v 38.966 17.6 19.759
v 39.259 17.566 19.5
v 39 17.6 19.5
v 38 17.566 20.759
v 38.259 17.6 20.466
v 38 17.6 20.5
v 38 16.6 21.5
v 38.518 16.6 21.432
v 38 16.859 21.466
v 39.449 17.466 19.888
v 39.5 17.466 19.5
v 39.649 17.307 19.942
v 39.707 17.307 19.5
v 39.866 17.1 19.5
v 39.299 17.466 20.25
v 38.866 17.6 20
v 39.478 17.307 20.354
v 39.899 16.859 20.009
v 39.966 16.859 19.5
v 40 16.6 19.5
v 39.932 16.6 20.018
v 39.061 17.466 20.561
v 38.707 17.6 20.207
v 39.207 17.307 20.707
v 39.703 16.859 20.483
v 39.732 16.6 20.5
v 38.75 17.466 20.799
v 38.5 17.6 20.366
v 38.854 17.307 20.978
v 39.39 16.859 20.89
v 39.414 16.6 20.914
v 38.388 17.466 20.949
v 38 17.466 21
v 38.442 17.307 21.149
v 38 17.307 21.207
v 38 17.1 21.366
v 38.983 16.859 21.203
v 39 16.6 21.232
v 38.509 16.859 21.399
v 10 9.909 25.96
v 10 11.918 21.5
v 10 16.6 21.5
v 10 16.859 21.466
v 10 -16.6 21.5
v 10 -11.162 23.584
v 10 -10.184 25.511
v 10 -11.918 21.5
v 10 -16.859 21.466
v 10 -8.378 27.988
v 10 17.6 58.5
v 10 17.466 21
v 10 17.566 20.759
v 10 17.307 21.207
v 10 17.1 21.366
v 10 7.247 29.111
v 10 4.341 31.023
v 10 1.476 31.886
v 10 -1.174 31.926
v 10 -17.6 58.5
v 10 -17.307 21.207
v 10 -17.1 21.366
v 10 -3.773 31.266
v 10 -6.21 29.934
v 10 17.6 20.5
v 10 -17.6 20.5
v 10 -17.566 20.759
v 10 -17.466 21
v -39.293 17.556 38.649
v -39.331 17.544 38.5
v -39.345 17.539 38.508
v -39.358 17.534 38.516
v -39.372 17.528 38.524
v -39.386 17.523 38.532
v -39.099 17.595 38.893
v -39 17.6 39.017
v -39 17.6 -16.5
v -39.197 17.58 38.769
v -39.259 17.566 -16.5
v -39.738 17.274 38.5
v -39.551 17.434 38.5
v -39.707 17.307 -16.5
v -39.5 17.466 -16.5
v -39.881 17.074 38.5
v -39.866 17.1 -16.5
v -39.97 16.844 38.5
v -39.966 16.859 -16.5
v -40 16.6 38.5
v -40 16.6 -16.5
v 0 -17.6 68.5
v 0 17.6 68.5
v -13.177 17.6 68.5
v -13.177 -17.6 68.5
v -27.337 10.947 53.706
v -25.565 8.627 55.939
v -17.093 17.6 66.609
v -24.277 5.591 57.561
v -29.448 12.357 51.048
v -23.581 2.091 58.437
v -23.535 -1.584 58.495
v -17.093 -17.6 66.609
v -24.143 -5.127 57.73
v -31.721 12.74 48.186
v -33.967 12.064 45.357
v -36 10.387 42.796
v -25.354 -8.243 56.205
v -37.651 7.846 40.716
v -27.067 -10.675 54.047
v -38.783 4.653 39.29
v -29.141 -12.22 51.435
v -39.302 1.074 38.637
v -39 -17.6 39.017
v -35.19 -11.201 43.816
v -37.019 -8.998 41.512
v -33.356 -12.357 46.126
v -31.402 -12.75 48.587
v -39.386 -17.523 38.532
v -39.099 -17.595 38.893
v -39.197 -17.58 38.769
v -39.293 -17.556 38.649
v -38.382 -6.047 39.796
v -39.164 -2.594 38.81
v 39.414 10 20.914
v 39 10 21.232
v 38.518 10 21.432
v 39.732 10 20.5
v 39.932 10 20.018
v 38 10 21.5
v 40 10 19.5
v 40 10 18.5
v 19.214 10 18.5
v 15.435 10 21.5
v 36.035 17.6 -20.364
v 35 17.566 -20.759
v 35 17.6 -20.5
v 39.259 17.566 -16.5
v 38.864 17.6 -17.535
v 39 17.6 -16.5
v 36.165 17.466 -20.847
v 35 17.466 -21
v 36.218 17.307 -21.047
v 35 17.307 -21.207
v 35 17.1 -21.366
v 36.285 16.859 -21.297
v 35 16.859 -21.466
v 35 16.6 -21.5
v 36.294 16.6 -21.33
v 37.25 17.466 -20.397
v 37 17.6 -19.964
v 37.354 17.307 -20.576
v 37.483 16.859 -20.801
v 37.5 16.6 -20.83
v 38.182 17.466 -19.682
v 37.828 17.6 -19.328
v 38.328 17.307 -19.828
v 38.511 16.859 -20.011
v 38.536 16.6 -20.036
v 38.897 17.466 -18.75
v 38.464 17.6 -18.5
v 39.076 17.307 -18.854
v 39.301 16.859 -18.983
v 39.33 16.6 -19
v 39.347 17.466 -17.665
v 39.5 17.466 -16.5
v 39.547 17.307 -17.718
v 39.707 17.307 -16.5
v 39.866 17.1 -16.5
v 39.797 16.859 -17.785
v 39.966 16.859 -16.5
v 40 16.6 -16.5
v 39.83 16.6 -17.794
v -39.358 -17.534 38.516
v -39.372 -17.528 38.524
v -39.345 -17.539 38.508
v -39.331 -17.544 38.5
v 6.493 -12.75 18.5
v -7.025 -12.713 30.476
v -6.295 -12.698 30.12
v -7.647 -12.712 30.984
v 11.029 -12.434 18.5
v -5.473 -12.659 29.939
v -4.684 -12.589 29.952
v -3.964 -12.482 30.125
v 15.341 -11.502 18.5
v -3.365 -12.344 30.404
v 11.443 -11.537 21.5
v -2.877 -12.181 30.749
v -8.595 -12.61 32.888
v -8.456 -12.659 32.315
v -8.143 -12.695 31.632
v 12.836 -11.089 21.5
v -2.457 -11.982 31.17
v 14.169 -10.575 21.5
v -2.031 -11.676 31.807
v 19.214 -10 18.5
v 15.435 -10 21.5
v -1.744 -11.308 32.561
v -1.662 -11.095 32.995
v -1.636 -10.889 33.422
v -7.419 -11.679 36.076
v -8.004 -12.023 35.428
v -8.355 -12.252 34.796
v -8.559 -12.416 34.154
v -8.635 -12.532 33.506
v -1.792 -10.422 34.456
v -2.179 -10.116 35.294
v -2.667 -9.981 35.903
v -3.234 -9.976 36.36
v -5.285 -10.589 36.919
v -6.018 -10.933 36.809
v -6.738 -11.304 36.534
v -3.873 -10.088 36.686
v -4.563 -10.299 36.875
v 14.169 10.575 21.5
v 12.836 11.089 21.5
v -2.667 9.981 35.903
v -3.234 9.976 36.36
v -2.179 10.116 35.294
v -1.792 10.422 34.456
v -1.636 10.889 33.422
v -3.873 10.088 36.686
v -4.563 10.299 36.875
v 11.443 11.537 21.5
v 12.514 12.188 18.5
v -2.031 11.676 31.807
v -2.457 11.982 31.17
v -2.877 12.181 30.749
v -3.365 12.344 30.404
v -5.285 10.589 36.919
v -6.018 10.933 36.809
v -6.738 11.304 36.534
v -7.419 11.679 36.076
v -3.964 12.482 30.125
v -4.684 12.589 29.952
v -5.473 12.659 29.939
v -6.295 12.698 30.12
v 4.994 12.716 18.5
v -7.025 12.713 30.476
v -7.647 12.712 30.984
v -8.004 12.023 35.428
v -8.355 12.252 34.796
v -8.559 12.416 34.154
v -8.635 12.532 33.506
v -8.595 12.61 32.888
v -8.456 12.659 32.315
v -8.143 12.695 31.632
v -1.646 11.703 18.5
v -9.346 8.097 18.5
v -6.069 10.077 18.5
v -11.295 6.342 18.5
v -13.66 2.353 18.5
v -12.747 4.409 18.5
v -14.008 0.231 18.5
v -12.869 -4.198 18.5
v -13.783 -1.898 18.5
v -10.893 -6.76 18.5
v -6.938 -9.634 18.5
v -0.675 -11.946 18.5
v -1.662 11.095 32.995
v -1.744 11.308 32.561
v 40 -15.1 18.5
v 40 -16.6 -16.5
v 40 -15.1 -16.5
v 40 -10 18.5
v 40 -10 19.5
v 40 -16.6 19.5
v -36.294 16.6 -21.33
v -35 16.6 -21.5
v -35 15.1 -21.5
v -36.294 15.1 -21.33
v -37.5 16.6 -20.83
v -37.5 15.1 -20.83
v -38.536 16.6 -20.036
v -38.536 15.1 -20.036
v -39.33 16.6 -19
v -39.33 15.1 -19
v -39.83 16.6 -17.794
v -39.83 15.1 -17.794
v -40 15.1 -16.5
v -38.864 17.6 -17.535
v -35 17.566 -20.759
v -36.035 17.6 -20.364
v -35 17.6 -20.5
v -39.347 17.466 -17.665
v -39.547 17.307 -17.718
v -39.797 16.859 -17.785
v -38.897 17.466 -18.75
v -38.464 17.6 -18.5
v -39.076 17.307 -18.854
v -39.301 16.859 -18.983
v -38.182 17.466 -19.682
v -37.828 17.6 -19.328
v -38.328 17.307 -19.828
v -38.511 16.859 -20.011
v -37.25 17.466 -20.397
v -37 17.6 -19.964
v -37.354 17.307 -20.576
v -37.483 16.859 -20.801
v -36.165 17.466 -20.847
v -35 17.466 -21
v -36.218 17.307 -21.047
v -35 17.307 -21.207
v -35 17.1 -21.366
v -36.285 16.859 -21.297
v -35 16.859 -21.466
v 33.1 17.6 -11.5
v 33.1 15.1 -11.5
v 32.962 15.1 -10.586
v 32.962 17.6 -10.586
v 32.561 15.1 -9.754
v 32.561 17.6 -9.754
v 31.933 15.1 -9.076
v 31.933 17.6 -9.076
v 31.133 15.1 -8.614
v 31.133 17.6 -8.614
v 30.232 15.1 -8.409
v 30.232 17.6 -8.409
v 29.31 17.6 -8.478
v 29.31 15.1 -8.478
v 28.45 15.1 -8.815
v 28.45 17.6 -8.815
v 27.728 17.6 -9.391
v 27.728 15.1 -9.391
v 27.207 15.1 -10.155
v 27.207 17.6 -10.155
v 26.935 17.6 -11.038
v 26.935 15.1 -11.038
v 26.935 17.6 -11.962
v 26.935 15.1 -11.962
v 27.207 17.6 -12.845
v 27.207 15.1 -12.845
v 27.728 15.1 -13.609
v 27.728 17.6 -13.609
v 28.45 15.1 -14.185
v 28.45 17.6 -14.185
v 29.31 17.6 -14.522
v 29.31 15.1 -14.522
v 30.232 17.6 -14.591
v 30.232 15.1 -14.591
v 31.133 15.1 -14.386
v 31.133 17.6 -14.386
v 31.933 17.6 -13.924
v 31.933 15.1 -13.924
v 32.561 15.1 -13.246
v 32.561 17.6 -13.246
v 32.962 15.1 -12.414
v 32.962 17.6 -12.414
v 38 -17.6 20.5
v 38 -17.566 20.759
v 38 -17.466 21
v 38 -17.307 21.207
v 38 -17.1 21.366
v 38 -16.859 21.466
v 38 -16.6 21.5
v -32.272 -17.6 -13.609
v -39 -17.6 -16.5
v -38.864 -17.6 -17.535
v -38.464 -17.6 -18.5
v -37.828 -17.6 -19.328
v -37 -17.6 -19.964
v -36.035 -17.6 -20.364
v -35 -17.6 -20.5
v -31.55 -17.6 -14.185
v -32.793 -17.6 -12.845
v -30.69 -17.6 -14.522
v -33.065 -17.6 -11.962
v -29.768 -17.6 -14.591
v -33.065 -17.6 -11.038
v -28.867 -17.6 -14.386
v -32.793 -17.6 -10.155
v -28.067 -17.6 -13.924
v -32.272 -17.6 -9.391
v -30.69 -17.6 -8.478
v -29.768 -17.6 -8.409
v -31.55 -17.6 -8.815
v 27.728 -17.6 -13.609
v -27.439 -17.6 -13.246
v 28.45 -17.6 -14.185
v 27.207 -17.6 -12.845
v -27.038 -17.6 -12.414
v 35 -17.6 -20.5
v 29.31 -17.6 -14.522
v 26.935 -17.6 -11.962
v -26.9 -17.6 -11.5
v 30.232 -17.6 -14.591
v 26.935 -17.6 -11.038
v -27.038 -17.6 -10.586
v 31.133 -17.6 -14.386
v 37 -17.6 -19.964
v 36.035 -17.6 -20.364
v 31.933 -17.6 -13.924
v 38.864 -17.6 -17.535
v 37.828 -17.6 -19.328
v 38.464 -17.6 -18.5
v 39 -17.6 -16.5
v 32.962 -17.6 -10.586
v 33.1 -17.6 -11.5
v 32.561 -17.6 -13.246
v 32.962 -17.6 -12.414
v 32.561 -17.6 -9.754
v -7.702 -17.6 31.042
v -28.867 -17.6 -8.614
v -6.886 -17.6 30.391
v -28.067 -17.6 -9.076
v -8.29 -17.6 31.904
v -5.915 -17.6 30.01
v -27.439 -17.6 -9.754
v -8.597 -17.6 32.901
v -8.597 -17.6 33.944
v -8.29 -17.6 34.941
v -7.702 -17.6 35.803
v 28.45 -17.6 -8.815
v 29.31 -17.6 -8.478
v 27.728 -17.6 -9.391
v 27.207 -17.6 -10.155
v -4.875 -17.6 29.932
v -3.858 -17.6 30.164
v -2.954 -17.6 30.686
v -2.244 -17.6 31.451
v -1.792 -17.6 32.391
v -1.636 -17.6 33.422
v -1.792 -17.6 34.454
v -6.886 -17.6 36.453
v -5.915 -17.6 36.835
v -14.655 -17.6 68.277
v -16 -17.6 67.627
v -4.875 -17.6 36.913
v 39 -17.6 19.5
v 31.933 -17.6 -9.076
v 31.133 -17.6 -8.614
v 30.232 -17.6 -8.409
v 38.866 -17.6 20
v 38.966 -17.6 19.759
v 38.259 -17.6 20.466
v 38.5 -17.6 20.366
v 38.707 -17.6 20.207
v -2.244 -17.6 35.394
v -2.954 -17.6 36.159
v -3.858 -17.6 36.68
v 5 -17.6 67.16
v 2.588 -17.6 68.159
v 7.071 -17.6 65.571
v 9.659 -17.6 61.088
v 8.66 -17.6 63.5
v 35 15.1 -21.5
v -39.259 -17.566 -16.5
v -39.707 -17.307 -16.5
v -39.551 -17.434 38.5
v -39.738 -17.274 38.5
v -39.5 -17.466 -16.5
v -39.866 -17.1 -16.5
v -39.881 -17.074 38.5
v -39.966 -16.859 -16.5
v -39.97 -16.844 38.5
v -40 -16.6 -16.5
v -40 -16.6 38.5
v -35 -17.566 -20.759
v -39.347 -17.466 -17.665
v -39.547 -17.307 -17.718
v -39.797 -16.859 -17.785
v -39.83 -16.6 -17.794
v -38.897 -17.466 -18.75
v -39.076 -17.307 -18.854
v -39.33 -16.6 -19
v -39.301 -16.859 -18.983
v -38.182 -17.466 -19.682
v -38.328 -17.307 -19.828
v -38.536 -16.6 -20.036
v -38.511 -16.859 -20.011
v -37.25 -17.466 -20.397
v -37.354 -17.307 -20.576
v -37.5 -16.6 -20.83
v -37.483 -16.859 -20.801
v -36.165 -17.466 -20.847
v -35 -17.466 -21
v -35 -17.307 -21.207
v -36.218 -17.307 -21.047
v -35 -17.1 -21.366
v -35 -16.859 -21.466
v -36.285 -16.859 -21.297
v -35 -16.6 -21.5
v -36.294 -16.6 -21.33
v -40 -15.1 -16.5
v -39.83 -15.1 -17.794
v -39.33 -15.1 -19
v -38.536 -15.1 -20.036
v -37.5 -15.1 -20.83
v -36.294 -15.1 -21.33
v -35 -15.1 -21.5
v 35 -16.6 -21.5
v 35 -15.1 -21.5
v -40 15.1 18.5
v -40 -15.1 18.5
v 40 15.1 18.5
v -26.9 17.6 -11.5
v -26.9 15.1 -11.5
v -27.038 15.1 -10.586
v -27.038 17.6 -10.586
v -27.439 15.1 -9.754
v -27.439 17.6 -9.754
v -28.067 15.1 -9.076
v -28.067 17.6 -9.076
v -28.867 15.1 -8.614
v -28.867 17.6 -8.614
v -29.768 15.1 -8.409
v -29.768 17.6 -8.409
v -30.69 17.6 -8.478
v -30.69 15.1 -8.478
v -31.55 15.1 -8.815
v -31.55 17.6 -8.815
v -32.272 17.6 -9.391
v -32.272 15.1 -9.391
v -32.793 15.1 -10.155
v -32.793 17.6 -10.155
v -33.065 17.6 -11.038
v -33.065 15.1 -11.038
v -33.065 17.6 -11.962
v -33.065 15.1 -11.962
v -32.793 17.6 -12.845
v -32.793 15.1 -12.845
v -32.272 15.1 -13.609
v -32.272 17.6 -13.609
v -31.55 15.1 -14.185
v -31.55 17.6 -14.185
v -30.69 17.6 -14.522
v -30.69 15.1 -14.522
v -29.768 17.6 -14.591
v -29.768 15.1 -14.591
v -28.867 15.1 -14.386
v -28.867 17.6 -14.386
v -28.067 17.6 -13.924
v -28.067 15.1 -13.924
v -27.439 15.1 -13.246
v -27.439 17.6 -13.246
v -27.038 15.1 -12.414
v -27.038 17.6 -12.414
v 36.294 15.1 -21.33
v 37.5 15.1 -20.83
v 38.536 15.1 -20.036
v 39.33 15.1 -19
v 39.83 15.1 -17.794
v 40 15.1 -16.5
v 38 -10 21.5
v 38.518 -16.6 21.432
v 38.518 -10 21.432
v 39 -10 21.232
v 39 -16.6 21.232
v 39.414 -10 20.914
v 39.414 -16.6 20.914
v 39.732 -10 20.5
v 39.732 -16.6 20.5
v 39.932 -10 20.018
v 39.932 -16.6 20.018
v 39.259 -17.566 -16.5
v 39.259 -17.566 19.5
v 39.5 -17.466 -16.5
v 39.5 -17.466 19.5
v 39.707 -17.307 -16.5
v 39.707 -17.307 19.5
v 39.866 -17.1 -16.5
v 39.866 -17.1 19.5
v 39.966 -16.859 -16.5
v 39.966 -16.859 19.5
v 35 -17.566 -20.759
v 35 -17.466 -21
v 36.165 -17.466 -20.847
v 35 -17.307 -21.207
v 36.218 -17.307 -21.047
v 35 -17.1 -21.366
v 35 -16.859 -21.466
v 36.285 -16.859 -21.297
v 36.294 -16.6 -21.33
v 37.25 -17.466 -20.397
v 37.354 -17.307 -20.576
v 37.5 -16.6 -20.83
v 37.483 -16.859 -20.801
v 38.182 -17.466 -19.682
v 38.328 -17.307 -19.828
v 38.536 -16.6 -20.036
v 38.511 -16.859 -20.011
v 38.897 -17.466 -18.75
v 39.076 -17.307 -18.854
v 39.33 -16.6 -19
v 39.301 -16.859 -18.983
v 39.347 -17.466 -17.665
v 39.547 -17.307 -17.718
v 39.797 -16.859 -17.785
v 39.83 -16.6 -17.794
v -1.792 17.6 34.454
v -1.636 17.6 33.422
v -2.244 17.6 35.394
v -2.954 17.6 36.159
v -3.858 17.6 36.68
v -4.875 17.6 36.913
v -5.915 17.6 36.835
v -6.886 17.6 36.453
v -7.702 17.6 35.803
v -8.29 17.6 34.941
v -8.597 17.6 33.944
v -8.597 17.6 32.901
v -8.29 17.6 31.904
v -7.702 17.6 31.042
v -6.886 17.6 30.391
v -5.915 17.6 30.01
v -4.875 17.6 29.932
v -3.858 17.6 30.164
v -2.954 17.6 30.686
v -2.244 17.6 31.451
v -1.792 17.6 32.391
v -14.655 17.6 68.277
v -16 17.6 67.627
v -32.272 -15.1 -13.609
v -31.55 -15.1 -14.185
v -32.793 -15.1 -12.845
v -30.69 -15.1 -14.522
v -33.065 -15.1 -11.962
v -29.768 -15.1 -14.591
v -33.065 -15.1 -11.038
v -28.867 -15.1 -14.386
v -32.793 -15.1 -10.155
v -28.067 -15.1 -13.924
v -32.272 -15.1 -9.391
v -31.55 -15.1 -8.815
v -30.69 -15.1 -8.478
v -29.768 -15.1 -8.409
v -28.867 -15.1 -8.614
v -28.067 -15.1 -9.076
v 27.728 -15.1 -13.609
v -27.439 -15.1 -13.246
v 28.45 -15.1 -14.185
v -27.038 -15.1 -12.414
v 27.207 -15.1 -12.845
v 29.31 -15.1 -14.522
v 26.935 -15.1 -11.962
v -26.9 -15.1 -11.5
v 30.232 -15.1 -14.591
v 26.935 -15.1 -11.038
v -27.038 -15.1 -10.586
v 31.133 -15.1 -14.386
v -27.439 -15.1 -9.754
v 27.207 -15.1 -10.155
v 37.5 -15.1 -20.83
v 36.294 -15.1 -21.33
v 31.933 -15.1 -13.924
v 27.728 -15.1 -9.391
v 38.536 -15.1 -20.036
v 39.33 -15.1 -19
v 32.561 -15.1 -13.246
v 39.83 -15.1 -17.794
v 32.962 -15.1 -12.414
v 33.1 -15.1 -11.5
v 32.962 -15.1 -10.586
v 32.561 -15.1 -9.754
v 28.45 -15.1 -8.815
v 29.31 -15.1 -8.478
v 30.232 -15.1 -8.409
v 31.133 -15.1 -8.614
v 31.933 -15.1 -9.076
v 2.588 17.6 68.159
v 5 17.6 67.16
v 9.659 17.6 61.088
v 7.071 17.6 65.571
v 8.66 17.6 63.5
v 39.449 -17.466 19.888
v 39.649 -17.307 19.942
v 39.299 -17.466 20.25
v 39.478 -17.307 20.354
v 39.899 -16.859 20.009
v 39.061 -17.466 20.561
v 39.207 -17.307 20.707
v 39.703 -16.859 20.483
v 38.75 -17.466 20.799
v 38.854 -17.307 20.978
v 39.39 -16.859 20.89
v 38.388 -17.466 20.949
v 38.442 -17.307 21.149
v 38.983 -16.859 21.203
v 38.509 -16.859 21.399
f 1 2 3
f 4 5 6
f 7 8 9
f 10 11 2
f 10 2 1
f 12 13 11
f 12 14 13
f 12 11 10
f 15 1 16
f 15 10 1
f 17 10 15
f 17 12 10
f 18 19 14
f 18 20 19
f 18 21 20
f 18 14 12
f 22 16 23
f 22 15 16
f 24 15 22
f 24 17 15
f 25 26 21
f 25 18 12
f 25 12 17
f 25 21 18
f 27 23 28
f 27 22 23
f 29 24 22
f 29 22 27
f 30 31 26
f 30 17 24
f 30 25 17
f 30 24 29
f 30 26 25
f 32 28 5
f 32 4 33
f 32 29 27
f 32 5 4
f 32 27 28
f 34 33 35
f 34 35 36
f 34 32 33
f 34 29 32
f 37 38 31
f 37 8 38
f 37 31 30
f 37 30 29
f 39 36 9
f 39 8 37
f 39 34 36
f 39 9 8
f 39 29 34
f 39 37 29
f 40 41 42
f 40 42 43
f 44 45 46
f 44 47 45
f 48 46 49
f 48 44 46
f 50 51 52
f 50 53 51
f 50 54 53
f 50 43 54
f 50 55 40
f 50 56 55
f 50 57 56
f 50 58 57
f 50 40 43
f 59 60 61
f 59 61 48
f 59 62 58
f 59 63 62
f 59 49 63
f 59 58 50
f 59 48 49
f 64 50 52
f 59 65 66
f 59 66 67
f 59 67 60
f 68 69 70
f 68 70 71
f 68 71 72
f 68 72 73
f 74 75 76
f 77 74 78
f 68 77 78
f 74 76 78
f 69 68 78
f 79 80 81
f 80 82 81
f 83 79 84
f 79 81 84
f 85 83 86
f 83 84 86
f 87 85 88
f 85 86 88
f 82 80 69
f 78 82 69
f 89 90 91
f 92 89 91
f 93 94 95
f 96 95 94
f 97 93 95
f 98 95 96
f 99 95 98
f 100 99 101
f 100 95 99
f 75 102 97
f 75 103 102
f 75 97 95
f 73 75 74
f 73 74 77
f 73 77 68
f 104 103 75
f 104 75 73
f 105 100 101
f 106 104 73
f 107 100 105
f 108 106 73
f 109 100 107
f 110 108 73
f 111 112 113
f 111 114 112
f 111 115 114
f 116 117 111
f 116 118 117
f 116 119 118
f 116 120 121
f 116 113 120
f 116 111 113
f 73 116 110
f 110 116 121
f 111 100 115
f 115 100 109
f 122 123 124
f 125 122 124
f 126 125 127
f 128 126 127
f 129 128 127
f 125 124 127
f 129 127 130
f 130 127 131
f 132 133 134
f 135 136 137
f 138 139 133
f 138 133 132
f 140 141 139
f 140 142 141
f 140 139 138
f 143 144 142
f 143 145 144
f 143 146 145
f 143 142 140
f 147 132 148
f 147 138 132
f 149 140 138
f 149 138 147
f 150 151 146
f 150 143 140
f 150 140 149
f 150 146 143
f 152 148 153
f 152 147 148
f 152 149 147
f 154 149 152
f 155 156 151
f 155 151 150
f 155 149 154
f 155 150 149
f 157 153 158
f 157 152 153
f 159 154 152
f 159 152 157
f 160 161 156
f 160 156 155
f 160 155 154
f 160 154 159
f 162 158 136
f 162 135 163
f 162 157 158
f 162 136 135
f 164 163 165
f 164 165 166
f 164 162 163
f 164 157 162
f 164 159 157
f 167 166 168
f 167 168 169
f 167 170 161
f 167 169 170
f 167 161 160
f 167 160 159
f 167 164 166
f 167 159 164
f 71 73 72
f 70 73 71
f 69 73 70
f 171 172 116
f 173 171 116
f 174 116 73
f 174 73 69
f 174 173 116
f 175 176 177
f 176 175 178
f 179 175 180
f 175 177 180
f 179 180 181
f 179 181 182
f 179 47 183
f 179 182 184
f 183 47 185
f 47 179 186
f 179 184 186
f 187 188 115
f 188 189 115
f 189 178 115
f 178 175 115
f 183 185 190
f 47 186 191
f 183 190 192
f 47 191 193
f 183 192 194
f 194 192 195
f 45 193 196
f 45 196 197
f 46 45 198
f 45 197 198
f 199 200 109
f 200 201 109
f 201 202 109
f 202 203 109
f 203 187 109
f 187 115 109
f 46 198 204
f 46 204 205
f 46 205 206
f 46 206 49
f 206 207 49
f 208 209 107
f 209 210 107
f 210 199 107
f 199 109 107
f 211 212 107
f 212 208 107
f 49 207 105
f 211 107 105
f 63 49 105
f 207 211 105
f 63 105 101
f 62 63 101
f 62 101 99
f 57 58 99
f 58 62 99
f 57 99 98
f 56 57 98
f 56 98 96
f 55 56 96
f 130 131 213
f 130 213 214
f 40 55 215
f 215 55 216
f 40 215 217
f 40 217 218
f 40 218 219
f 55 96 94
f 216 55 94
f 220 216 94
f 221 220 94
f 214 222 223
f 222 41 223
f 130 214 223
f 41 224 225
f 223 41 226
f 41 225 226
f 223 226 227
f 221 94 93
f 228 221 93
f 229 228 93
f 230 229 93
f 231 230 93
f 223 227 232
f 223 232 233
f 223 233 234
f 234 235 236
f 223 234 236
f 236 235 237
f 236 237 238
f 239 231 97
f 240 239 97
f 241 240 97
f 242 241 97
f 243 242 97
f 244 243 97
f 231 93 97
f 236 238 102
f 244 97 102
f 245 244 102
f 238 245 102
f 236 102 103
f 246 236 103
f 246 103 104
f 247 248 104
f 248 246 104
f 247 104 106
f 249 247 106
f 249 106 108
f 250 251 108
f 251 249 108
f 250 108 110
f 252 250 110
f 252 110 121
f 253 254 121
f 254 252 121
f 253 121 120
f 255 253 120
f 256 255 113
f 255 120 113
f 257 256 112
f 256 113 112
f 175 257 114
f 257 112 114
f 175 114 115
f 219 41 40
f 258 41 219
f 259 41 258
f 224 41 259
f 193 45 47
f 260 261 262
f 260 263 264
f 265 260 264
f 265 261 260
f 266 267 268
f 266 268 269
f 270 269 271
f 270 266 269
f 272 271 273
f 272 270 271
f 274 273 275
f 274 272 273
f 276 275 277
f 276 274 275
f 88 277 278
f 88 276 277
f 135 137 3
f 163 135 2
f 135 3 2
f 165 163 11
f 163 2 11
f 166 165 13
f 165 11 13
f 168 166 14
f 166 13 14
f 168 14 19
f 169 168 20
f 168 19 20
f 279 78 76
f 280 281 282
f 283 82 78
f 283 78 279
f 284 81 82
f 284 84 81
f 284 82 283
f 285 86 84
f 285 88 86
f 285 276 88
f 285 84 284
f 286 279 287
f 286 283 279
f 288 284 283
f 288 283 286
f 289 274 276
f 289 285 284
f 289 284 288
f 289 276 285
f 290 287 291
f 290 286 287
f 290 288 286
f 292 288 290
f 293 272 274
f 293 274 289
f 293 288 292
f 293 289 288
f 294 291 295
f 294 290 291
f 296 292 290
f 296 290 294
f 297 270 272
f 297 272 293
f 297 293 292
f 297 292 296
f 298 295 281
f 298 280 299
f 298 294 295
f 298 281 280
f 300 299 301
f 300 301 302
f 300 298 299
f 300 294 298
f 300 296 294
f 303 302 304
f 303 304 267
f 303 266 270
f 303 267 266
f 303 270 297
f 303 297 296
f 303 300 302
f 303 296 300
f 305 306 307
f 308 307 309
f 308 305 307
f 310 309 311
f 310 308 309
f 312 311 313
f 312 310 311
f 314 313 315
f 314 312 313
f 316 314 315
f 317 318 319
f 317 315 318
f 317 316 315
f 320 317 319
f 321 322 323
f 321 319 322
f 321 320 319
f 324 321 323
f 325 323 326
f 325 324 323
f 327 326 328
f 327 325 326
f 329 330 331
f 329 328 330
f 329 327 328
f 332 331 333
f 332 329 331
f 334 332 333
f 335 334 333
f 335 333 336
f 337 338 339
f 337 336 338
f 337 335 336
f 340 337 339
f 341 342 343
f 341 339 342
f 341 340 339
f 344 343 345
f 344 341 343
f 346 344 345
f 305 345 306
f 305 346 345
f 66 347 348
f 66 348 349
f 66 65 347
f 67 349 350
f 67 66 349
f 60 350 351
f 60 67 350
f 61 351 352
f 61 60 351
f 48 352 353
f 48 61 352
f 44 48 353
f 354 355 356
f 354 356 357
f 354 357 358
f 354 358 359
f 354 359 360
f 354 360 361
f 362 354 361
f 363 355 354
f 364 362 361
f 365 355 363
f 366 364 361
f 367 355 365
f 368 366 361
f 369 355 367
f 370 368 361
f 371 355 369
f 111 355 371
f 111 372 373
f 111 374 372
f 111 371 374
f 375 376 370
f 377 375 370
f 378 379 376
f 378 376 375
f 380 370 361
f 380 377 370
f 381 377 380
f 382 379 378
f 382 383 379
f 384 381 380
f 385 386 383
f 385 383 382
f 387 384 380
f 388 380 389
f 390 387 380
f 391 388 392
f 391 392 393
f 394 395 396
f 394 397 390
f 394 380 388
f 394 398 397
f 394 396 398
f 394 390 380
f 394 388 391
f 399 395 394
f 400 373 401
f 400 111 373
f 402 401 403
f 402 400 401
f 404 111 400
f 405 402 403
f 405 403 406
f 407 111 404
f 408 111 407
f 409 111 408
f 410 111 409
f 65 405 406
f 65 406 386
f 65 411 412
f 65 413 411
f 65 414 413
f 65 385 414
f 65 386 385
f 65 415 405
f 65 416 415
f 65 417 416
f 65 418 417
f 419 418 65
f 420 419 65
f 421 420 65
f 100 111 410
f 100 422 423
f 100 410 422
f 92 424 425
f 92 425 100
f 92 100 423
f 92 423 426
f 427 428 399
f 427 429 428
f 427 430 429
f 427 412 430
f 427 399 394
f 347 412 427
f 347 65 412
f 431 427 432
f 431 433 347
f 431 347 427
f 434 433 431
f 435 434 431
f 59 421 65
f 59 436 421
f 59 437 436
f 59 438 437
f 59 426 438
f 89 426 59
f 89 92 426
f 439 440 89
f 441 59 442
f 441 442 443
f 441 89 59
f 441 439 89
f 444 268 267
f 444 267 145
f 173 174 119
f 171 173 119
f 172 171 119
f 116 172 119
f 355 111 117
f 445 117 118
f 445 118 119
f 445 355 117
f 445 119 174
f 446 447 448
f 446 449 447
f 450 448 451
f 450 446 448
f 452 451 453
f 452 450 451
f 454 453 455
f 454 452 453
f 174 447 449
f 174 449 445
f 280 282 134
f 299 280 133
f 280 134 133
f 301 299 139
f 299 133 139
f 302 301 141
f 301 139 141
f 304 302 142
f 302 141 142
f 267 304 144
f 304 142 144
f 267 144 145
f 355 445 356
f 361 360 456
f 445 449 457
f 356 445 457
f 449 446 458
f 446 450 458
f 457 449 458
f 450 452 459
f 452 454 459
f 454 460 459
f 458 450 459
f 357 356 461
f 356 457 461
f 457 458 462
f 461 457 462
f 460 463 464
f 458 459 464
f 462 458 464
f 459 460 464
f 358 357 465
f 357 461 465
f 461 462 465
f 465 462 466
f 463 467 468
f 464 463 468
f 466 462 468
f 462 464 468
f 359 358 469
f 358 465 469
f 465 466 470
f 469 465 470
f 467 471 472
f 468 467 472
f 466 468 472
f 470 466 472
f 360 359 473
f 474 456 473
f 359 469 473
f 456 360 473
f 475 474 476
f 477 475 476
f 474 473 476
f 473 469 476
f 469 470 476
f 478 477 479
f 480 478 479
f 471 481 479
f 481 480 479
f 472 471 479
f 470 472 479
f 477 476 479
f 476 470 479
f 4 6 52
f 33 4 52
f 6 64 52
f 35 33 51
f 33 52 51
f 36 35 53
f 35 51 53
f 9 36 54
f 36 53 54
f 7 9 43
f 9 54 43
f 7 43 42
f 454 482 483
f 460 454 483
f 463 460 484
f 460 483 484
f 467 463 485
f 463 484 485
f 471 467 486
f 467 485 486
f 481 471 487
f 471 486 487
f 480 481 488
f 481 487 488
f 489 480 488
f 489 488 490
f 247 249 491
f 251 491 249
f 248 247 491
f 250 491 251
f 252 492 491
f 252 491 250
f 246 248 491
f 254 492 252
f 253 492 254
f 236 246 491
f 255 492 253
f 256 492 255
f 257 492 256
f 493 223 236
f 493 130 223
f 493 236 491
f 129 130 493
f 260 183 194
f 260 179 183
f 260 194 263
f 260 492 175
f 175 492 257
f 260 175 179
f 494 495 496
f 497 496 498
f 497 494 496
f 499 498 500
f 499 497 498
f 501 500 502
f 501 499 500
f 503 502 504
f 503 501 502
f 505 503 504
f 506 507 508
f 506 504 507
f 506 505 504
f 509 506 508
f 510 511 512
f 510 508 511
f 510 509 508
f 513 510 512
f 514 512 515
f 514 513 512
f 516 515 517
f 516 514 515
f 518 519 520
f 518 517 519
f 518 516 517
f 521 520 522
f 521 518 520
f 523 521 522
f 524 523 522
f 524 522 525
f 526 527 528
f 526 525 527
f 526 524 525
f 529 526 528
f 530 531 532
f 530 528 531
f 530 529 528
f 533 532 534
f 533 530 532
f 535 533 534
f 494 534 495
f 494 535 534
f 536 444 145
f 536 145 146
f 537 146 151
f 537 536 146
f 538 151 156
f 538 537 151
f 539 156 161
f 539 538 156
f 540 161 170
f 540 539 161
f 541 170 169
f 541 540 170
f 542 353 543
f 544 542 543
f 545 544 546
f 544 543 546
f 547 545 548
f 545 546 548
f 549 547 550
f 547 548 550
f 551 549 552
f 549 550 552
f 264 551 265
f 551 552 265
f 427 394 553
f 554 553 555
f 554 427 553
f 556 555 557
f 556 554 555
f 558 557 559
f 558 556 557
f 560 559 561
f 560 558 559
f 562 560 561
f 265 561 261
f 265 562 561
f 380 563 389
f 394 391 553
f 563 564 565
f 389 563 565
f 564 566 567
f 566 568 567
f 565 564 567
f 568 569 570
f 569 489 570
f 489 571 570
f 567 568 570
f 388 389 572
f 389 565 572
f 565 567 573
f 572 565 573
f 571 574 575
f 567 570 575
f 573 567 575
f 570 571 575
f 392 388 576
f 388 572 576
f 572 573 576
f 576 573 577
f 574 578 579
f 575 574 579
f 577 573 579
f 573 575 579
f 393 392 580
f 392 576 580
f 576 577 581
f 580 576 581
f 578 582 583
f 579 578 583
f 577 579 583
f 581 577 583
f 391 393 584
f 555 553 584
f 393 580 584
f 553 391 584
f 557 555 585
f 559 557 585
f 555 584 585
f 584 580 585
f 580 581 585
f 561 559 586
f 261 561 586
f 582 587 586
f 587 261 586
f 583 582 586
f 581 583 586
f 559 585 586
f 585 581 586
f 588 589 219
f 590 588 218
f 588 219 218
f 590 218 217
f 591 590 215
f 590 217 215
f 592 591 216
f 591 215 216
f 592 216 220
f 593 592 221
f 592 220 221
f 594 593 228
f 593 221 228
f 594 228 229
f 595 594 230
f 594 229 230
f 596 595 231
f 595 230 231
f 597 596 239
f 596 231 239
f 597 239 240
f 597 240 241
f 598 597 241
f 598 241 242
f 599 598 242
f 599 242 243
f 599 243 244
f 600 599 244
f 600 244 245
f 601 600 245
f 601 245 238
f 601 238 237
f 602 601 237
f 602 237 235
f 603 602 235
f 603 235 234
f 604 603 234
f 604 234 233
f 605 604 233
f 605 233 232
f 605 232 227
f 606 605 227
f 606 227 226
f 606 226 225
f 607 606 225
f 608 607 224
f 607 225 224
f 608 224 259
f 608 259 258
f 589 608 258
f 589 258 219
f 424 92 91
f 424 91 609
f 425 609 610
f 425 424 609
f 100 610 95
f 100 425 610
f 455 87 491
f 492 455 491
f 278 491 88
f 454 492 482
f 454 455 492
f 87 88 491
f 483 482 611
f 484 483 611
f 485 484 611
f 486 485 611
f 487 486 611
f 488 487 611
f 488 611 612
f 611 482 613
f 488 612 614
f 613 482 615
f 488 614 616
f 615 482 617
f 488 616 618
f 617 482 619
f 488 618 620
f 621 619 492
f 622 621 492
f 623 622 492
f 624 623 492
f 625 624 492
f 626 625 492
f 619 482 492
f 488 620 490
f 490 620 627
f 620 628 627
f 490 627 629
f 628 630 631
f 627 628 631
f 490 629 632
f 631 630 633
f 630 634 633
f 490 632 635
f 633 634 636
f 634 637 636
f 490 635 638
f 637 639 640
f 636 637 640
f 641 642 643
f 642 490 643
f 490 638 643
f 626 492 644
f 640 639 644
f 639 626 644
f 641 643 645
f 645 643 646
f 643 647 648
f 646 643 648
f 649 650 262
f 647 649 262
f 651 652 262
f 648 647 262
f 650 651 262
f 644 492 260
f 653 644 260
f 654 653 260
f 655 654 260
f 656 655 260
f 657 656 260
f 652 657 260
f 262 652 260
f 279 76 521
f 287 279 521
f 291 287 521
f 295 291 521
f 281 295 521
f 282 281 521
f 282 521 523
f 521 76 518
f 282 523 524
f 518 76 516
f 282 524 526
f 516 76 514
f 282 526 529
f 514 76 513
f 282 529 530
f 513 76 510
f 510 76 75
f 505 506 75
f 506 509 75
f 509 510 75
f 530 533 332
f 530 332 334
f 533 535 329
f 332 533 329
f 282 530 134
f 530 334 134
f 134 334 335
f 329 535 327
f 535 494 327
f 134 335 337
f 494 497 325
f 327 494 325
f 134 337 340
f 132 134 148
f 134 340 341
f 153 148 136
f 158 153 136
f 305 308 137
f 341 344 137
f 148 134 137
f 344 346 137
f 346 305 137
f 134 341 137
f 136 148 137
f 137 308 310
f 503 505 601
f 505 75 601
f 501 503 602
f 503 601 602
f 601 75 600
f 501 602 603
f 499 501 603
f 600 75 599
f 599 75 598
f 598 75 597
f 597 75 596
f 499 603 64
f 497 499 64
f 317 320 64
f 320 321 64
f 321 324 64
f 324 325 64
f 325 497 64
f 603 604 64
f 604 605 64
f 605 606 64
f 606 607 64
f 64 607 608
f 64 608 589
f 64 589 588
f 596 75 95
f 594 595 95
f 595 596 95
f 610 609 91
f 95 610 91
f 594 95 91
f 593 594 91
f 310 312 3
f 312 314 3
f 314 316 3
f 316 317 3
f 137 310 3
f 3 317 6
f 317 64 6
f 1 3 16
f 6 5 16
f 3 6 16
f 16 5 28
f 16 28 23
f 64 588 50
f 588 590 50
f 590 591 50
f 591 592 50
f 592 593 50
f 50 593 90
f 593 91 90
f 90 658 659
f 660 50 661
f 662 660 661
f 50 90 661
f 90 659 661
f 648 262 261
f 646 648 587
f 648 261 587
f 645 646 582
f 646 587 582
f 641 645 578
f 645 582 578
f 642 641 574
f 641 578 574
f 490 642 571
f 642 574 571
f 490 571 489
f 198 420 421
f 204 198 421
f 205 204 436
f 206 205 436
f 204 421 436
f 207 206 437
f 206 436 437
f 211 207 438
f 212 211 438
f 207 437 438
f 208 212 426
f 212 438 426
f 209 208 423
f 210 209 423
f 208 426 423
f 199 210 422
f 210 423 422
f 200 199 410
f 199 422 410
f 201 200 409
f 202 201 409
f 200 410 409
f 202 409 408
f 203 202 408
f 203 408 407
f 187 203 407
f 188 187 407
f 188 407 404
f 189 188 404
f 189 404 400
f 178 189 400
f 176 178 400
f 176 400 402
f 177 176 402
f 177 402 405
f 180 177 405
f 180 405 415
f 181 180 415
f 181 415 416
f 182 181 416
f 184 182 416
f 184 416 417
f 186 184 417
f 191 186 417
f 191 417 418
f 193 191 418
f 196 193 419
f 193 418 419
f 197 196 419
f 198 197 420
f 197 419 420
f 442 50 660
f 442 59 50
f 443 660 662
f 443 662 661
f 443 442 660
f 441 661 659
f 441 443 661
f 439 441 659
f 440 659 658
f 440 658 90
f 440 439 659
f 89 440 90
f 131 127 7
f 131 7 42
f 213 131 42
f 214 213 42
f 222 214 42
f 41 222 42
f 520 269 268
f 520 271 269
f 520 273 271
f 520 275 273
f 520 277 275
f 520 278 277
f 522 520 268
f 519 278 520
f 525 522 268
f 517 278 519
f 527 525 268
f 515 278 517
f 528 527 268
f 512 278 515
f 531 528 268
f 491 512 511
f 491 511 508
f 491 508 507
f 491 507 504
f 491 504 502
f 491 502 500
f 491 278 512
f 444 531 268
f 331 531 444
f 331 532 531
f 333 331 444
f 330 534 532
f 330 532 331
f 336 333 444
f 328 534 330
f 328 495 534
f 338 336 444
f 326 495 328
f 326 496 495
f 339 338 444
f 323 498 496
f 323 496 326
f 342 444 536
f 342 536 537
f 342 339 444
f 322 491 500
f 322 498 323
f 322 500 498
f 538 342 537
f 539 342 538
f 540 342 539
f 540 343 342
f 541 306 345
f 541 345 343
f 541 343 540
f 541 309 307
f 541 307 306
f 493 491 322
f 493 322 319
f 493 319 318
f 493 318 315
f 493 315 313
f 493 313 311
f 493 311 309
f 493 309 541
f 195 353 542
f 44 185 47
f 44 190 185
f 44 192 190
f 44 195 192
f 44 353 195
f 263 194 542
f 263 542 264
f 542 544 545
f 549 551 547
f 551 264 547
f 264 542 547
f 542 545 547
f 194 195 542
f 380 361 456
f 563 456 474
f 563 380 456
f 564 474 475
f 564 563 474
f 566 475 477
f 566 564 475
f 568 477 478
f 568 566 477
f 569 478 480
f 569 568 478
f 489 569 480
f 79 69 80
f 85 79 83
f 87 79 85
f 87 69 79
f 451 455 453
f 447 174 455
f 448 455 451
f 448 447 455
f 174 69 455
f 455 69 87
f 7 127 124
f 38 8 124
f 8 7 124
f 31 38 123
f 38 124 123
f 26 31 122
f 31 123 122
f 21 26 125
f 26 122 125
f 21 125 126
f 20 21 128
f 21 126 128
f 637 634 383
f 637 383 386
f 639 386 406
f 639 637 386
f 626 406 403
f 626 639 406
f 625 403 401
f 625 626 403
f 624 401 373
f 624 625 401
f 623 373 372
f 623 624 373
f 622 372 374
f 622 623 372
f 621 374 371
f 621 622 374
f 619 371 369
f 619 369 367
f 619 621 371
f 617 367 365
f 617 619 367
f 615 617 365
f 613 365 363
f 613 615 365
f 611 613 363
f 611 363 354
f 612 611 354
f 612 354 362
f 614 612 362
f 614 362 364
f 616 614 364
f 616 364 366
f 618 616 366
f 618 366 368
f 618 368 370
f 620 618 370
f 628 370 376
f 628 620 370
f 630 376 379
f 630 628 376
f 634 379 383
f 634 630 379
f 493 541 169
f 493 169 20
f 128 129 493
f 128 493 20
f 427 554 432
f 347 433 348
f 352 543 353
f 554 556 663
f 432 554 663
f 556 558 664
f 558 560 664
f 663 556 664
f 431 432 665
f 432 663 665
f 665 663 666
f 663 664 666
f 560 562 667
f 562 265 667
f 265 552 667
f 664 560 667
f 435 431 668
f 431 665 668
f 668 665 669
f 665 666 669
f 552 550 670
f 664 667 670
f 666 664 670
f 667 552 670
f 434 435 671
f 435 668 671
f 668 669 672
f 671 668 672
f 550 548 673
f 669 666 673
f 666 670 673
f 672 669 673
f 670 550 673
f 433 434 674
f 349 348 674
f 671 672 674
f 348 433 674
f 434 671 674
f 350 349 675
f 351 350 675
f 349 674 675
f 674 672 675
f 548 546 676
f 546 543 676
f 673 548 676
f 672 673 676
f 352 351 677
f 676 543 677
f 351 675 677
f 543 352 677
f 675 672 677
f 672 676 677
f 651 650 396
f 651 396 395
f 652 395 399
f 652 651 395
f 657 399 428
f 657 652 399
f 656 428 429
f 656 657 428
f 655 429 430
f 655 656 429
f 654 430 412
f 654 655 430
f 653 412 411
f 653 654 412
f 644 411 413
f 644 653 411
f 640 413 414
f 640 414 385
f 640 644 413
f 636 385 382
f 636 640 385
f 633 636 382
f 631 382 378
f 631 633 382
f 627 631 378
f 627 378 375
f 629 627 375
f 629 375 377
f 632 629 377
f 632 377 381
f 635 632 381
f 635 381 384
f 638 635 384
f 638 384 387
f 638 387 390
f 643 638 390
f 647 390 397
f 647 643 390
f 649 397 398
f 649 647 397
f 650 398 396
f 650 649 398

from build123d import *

# Parameters (mm, degrees)
F0_R      = 3.1
F1_DEPTH  = 17.6
F2_W      = 80
F2_H      = 40
F3_DEPTH  = 15.1
F4_R      = 5
F5_R      = 5
F6_R      = 10
F8_DEPTH  = 5
F9_R      = 12.75
F10_DEPTH = 99.501459
F11_R     = 2
F12_R     = 1
F13_R     = 3.5
F14_DEPTH = 40


with BuildPart() as f1:
    # F0 (on Front) → F1 (new body, symmetric)
    with BuildSketch(Plane.XZ):
        with BuildLine():
            Line((-40, -21.5), (40, -21.5))
            Line((40, -21.5), (40, 21.5))
            Line((40, 21.5), (10, 21.5))
            Line((10, 21.5), (10, 68.5))
            Line((10, 68.5), (-13.177477, 68.5))
            ThreePointArc((-13.177477, 68.5), (-15.35175, 68.002504), (-17.093345, 66.609015))
            Line((-17.093345, 66.609015), (-39.385551, 38.531528))
            Line((-39.385551, 38.531528), (-39.330944, 38.5))
            Line((-39.330944, 38.5), (-40, 38.5))
            Line((-40, 38.5), (-40, 21.5))
            Line((-40, 21.5), (-40, -21.5))
        make_face()
        with Locations((-30, -11.5)):
            Circle(F0_R, mode=Mode.SUBTRACT)
        with Locations((30, -11.5)):
            Circle(F0_R, mode=Mode.SUBTRACT)
    extrude(amount=F1_DEPTH, both=True)

    # F2 (on Front) → F3 (cut, symmetric)
    with BuildSketch(Plane.XZ):
        with Locations((0, -1.5)):
            Rectangle(F2_W, F2_H)
    extrude(amount=F3_DEPTH, both=True, mode=Mode.SUBTRACT)

    # F4
    f4_edges = [f1.edges().sort_by_distance(p)[0] for p in [
        (40, 16.35, -21.5),
        (40, -16.35, -21.5),
    ]]
    fillet(f4_edges, radius=F4_R)

    # F5
    f5_edges = [f1.edges().sort_by_distance(p)[0] for p in [
        (-40, 16.35, -21.5),
        (-40, -16.35, -21.5),
    ]]
    fillet(f5_edges, radius=F5_R)

    # F6
    f6_edges = [f1.edges().sort_by_distance(p)[0] for p in [
        (10, 0, 68.5),
    ]]
    fillet(f6_edges, radius=F6_R)

    # F7 (on face) → F8 (cut)
    with BuildSketch(Plane.XY.offset(21.5)):
        with BuildLine():
            Line((15, -10), (40, -10))
            Line((40, -10), (40, 0))
            Line((40, 0), (40, 10))
            Line((40, 10), (15, 10))
            ThreePointArc((15, 10), (11.464466, 8.535534), (10, 5))
            Line((10, 5), (10, -5))
            ThreePointArc((10, -5), (11.464466, -8.535534), (15, -10))
        make_face()
    extrude(amount=-F8_DEPTH, mode=Mode.SUBTRACT)

    # F9 (on face) → F10 (cut, through all)
    with BuildSketch(Plane(origin=(-42.921633, 0, 34.07776), x_dir=(0, -1, 0), z_dir=(-0.783174, 0, 0.621803))):
        with Locations((0, 18.526129)):
            Circle(F9_R)
    extrude(amount=-F10_DEPTH, mode=Mode.SUBTRACT)

    # F11
    f11_edges = [f1.edges().sort_by_distance(p)[0] for p in [
        (40, 13.8, 21.5),
        (40, -13.8, 21.5),
    ]]
    fillet(f11_edges, radius=F11_R)

    # F12
    f12_edges = [f1.edges().sort_by_distance(p)[0] for p in [
        (40, -17.6, 1.5),
        (40, 17.6, 1.5),
    ]]
    fillet(f12_edges, radius=F12_R)

    # F13 (on face) → F14 (cut)
    with BuildSketch(Plane.XZ.offset(17.6)):
        with Locations((-5.136279, 33.422398)):
            Circle(F13_R)
    extrude(amount=-F14_DEPTH, mode=Mode.SUBTRACT)


solid = f1.part
